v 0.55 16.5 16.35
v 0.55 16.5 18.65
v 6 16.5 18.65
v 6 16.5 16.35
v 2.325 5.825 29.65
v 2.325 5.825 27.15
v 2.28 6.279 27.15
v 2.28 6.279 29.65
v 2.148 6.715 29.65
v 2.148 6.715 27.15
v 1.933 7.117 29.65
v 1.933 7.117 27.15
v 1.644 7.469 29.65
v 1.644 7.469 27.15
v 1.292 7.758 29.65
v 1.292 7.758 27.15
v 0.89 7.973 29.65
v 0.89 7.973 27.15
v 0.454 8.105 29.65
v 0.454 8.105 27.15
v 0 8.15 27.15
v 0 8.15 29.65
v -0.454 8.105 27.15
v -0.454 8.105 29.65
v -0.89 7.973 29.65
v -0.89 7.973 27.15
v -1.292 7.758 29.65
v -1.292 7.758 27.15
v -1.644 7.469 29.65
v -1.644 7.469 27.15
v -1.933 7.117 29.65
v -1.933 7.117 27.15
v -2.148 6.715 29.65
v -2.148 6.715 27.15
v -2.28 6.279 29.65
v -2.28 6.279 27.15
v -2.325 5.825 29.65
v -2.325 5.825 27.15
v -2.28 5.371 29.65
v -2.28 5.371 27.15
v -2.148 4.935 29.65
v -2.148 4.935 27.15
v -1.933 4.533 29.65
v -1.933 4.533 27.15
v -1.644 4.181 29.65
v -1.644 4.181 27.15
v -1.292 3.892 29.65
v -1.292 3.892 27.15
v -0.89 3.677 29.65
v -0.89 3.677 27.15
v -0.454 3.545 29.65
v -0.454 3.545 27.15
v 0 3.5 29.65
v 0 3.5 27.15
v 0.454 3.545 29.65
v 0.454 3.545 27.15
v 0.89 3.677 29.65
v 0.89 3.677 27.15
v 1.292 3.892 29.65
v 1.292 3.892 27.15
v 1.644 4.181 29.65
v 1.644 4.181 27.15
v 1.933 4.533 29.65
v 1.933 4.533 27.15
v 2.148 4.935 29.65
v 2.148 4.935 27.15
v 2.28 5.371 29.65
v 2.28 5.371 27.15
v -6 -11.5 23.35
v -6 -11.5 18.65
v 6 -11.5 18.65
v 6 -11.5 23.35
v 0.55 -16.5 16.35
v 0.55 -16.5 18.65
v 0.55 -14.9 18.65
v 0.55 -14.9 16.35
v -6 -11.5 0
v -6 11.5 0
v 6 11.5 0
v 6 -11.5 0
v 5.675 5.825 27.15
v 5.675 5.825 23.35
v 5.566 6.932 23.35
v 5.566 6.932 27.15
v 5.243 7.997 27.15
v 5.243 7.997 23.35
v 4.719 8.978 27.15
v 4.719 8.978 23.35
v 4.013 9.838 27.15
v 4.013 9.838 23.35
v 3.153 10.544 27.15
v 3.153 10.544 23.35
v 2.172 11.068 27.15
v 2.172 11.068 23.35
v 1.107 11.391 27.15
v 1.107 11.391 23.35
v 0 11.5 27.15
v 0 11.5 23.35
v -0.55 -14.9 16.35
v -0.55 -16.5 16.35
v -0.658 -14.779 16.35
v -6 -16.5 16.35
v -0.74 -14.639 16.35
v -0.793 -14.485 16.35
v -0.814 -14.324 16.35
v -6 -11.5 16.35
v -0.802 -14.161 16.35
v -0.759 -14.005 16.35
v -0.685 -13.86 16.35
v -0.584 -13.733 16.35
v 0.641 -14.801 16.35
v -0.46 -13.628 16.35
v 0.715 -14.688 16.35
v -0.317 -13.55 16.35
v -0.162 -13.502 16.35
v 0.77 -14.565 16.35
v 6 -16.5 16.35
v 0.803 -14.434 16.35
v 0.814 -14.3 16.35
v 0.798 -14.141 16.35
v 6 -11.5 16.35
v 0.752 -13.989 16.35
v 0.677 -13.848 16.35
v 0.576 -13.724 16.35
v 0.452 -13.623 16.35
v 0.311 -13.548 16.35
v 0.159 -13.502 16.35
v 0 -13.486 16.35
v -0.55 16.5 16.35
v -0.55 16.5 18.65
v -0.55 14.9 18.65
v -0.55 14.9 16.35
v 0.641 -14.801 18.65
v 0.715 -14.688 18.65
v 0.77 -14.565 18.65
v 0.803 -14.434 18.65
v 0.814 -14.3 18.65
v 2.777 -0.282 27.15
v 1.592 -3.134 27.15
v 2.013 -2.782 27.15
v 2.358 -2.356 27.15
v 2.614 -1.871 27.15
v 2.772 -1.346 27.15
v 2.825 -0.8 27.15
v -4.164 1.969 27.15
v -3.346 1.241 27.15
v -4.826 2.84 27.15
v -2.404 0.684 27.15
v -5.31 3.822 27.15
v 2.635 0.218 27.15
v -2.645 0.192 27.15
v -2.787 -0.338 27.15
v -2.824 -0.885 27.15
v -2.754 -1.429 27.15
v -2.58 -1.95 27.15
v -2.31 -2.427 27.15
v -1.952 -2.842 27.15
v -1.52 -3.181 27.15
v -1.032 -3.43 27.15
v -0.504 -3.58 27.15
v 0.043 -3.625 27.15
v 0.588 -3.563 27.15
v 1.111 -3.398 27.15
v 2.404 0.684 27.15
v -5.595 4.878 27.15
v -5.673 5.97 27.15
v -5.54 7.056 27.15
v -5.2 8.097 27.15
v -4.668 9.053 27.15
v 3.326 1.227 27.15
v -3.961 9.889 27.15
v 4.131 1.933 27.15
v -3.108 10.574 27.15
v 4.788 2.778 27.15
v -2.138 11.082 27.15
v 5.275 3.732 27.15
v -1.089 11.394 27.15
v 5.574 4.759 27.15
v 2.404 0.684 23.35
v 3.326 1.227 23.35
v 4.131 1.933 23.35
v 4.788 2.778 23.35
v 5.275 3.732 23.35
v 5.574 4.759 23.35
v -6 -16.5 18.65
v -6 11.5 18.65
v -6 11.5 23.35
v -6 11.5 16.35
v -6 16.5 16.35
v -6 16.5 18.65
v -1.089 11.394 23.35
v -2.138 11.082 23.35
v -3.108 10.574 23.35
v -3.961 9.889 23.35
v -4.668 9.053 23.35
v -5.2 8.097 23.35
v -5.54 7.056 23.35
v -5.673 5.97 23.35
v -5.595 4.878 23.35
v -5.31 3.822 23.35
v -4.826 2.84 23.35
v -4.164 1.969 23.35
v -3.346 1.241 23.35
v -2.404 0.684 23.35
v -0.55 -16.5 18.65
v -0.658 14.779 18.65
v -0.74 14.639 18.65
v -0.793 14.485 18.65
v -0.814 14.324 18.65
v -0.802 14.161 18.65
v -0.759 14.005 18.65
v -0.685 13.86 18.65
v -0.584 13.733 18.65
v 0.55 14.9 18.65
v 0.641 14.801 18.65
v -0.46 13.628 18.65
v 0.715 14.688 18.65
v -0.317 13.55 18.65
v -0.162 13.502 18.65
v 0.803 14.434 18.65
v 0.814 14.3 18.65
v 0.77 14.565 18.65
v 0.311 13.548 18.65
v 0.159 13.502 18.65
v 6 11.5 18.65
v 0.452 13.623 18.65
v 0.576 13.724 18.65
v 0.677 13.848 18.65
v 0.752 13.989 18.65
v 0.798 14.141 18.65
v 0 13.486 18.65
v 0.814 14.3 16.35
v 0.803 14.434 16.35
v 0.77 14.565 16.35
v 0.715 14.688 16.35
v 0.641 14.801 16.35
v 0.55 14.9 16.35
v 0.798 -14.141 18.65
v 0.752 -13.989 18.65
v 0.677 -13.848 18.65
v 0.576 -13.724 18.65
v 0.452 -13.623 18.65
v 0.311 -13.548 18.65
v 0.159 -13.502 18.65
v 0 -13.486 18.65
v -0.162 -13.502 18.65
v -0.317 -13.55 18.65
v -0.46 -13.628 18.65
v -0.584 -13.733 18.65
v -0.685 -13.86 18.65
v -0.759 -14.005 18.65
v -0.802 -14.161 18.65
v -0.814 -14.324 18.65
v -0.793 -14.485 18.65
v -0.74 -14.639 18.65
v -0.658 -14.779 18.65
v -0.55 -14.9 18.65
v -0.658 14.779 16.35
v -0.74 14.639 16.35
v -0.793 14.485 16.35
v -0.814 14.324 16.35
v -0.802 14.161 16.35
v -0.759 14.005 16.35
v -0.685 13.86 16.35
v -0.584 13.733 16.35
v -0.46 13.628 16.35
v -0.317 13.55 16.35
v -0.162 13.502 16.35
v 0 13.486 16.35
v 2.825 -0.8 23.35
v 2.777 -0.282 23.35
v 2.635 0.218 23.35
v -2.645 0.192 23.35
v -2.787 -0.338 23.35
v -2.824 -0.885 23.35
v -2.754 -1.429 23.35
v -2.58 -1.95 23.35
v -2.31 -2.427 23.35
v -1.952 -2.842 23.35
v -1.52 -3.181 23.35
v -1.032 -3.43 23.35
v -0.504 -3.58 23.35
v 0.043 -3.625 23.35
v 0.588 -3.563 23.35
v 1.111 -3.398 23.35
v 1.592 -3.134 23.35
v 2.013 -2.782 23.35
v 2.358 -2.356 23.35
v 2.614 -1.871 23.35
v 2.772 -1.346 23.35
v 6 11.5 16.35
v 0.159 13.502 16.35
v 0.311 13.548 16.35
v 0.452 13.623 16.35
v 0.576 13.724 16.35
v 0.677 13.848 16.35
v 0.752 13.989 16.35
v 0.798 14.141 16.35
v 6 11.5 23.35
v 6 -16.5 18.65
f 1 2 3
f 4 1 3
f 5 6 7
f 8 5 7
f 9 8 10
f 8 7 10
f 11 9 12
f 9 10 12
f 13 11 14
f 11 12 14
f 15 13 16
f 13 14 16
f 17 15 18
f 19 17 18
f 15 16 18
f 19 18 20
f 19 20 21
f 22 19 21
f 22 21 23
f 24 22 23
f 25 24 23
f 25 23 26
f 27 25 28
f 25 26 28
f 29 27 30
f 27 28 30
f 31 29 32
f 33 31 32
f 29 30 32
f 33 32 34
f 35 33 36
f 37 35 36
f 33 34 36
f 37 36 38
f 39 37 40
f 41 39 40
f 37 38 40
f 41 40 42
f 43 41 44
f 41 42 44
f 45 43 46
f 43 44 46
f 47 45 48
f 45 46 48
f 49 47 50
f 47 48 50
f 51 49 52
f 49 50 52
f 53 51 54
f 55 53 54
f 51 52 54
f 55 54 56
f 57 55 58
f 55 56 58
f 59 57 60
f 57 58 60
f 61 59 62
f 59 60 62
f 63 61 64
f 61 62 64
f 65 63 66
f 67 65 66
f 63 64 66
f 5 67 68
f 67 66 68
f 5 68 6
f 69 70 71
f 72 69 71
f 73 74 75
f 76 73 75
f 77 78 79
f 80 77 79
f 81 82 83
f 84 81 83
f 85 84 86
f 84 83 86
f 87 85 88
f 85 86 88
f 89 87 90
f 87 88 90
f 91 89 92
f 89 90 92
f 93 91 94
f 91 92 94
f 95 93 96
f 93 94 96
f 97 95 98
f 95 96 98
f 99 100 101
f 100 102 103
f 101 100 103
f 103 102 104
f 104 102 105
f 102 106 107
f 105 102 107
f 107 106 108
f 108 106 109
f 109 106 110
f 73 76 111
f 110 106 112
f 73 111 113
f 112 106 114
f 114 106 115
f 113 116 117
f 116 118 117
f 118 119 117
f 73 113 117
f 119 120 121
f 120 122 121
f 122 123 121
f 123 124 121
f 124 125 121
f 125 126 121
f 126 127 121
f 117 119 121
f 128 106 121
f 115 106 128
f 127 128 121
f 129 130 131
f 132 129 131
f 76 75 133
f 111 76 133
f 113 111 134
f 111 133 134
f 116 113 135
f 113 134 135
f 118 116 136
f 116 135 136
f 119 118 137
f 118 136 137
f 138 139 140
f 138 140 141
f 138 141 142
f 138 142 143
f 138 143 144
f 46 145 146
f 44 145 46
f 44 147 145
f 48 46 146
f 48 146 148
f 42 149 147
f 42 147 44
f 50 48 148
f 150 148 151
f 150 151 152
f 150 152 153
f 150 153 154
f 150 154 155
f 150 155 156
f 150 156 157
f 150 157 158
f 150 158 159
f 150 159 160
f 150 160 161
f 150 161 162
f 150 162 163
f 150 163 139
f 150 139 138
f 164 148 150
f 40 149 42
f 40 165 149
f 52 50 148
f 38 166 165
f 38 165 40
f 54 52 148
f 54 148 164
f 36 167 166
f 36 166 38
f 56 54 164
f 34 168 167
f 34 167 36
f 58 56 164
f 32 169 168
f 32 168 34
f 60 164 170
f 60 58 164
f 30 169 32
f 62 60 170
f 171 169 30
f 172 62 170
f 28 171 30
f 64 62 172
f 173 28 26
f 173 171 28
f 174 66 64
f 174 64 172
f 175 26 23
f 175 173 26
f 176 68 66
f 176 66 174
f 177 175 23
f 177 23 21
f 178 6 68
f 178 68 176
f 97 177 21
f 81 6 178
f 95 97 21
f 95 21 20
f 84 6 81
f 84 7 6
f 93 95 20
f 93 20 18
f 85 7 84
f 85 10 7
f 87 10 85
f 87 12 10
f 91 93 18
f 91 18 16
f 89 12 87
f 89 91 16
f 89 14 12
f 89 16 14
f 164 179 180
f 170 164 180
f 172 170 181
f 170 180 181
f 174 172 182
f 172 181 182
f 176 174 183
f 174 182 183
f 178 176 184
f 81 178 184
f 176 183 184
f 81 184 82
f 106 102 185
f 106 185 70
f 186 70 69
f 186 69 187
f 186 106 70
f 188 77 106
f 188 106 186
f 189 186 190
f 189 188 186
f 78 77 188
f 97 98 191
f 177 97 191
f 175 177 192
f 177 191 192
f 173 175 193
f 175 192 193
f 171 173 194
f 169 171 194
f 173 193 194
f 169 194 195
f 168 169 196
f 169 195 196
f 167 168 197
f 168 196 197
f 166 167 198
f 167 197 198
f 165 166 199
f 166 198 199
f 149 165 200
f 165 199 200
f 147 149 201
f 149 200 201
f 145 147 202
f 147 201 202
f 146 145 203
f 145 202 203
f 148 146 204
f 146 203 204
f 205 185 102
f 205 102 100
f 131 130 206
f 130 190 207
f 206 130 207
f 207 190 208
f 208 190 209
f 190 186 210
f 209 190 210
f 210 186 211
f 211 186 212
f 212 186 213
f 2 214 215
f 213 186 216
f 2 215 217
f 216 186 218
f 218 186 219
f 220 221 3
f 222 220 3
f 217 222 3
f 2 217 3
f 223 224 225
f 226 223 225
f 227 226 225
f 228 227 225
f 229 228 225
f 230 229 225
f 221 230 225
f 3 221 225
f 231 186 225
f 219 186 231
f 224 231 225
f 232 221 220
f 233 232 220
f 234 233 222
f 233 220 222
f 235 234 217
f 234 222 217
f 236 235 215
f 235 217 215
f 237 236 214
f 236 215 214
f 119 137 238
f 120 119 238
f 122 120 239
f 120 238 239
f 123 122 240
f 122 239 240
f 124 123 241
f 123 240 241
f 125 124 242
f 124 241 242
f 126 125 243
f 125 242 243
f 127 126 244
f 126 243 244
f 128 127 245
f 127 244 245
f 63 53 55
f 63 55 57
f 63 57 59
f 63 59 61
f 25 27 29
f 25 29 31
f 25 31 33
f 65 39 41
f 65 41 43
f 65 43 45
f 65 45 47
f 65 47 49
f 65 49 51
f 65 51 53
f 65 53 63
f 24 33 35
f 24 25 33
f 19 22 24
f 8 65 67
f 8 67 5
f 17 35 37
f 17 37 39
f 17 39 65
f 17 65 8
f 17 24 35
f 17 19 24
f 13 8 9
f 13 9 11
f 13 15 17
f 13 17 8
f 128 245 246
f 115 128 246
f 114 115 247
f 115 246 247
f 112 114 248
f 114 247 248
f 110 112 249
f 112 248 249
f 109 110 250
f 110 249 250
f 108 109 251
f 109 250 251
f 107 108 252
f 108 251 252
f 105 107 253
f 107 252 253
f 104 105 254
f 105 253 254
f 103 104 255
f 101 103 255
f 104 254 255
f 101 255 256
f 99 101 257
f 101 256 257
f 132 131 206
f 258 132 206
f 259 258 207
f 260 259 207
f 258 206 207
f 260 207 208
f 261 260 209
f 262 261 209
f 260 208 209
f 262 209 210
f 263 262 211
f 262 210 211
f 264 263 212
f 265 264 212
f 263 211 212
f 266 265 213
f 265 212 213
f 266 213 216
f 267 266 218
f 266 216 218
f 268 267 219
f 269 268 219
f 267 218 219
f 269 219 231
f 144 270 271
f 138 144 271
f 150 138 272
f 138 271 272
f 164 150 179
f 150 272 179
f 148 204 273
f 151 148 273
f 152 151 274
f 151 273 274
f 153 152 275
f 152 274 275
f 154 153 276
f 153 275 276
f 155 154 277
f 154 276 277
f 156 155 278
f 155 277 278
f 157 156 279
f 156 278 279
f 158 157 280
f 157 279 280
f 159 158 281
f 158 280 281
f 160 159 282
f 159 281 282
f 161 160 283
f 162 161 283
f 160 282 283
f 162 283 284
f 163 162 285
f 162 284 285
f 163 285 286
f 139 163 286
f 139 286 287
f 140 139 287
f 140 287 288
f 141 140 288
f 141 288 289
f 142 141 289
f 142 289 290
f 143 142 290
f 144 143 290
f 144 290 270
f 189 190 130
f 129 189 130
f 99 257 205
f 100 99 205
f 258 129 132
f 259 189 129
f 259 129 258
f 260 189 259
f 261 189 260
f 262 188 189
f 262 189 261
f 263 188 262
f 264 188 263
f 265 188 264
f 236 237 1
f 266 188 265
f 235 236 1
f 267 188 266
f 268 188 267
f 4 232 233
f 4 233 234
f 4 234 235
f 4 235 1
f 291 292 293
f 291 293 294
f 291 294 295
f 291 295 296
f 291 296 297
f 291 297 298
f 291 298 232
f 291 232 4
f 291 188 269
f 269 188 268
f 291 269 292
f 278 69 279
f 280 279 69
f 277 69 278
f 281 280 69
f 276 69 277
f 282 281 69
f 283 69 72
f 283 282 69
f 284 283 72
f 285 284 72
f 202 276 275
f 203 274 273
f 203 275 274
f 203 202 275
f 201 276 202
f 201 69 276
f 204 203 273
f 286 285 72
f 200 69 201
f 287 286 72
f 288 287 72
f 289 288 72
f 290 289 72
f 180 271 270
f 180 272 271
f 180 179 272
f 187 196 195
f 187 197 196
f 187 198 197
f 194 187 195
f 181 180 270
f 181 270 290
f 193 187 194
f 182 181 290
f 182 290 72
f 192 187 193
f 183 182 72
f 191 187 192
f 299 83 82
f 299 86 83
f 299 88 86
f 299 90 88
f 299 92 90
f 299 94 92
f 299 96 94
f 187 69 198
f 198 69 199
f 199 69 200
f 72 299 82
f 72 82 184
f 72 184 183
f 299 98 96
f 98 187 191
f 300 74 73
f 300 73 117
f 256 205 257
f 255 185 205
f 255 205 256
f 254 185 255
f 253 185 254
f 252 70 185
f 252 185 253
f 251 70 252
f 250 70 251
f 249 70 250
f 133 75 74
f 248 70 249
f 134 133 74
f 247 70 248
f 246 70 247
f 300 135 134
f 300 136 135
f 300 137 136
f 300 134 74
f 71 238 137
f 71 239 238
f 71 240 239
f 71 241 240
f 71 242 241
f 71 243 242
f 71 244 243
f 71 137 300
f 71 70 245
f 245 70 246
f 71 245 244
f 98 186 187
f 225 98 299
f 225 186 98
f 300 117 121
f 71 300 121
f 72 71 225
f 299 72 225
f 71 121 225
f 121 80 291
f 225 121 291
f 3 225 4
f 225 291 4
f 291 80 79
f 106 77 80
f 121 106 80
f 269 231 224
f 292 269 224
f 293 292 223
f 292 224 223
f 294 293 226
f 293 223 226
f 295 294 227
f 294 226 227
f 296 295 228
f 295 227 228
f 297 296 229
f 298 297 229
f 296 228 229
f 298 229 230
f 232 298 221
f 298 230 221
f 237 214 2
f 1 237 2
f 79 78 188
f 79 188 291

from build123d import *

# Parameters (mm, degrees)
F0_W          = 12
F0_H          = 23
F1_DEPTH      = 23.35
F2_W          = 12
F2_H          = 2.3
F3_DEPTH      = 5
F3_DEPTH_BACK = 28
F5_DEPTH      = 3.8
F6_R          = 2.325
F7_DEPTH      = 2.5
F9_DEPTH      = 25
F11_DEPTH     = 25


with BuildPart() as f1:
    # F0 (on Top) → F1 (new body)
    with BuildSketch(Plane.XY):
        Rectangle(F0_W, F0_H)
    extrude(amount=F1_DEPTH)

    # F2 (on face) → F3 (join, two sides)
    with BuildSketch(Plane.XZ.offset(11.5)) as f3_sk:
        with Locations((0, 17.5)):
            Rectangle(F2_W, F2_H)
    extrude(amount=F3_DEPTH)
    extrude(f3_sk.sketch, amount=-F3_DEPTH_BACK)

    # F4 (on face) → F5 (join)
    with BuildSketch(Plane.XY.offset(23.35)):
        with BuildLine():
            ThreePointArc((5.675, 5.825), (4.0128309832, 9.8378309832), (0, 11.5))
            Line((0, 11.5), (0, 5.825))
            Line((0, 5.825), (0, 2.025))
            ThreePointArc((0, 2.025), (1.3761840956, 1.6671324113), (2.4037015124, 0.6841981132))
            ThreePointArc((2.4037015124, 0.6841981132), (4.7878299407, 2.7783117228), (5.675, 5.825))
        make_face()
        with BuildLine():
            Line((0, 5.825), (0, 11.5))
            ThreePointArc((0, 11.5), (-5.5398409592, 7.0561730773), (-2.4037015124, 0.6841981132))
            ThreePointArc((-2.4037015124, 0.6841981132), (-1.3761840956, 1.6671324113), (0, 2.025))
            Line((0, 2.025), (0, 5.825))
        make_face()
        with BuildLine():
            ThreePointArc((0, 2.025), (-1.3761840956, 1.6671324113), (-2.4037015124, 0.6841981132))
            ThreePointArc((-2.4037015124, 0.6841981132), (-1.2311730773, 0.2851590408), (0, 0.15))
            Line((0, 0.15), (0, 2.025))
        make_face()
        with BuildLine():
            ThreePointArc((0, 0.15), (-1.2311730773, 0.2851590408), (-2.4037015124, 0.6841981132))
            ThreePointArc((-2.4037015124, 0.6841981132), (-0.7714169519, -3.5176351643), (2.825, -0.8))
            ThreePointArc((2.825, -0.8), (2.7176351643, -0.0285830481), (2.4037015124, 0.6841981132))
            ThreePointArc((2.4037015124, 0.6841981132), (1.2311730773, 0.2851590408), (0, 0.15))
        make_face()
        with BuildLine():
            ThreePointArc((2.4037015124, 0.6841981132), (1.3761840956, 1.6671324113), (0, 2.025))
            Line((0, 2.025), (0, 0.15))
            ThreePointArc((0, 0.15), (1.2311730773, 0.2851590408), (2.4037015124, 0.6841981132))
        make_face()
    extrude(amount=F5_DEPTH)

    # F6 (on face) → F7 (join)
    with BuildSketch(Plane.XY.offset(27.15)):
        with Locations((0, 5.825)):
            Circle(F6_R)
    extrude(amount=F7_DEPTH)

    # F8 (on face) → F9 (cut)
    with BuildSketch(Plane.XY.offset(18.65)):
        with BuildLine():
            Line((0.55, 14.9), (-0.55, 14.9))
            ThreePointArc((-0.55, 14.9), (-0.7585725469, 14.0049276511), (0, 13.4860589702))
            ThreePointArc((0, 13.4860589702), (0.5755432217, 13.7244567783), (0.8139410298, 14.3))
            ThreePointArc((0.8139410298, 14.3), (0.7450394508, 14.6277441331), (0.55, 14.9))
        make_face()
        with BuildLine():
            Line((0.55, 16.5), (-0.55, 16.5))
            Line((-0.55, 16.5), (-0.55, 14.9))
            ThreePointArc((-0.55, 14.9), (0, 15.1139410298), (0.55, 14.9))
            Line((0.55, 14.9), (0.55, 16.5))
        make_face()
        with BuildLine():
            ThreePointArc((0.55, 14.9), (0, 15.1139410298), (-0.55, 14.9))
            Line((-0.55, 14.9), (0.55, 14.9))
        make_face()
    extrude(amount=-F9_DEPTH, mode=Mode.SUBTRACT)

    # F10 (on face) → F11 (cut)
    with BuildSketch(Plane.XY.offset(18.65)):
        with BuildLine():
            ThreePointArc((0, -13.4860589702), (-0.7585725469, -14.0049276511), (-0.55, -14.9))
            Line((-0.55, -14.9), (0.55, -14.9))
            ThreePointArc((0.55, -14.9), (0.7450394508, -14.6277441331), (0.8139410298, -14.3))
            ThreePointArc((0.8139410298, -14.3), (0.5755432217, -13.7244567783), (0, -13.4860589702))
        make_face()
        with BuildLine():
            ThreePointArc((0.55, -14.9), (0, -15.1139410298), (-0.55, -14.9))
            Line((-0.55, -14.9), (-0.55, -18.1))
            Line((-0.55, -18.1), (0.55, -18.1))
            Line((0.55, -18.1), (0.55, -14.9))
        make_face()
        with BuildLine():
            Line((0.55, -14.9), (-0.55, -14.9))
            ThreePointArc((-0.55, -14.9), (0, -15.1139410298), (0.55, -14.9))
        make_face()
    extrude(amount=-F11_DEPTH, mode=Mode.SUBTRACT)


solid = f1.part
